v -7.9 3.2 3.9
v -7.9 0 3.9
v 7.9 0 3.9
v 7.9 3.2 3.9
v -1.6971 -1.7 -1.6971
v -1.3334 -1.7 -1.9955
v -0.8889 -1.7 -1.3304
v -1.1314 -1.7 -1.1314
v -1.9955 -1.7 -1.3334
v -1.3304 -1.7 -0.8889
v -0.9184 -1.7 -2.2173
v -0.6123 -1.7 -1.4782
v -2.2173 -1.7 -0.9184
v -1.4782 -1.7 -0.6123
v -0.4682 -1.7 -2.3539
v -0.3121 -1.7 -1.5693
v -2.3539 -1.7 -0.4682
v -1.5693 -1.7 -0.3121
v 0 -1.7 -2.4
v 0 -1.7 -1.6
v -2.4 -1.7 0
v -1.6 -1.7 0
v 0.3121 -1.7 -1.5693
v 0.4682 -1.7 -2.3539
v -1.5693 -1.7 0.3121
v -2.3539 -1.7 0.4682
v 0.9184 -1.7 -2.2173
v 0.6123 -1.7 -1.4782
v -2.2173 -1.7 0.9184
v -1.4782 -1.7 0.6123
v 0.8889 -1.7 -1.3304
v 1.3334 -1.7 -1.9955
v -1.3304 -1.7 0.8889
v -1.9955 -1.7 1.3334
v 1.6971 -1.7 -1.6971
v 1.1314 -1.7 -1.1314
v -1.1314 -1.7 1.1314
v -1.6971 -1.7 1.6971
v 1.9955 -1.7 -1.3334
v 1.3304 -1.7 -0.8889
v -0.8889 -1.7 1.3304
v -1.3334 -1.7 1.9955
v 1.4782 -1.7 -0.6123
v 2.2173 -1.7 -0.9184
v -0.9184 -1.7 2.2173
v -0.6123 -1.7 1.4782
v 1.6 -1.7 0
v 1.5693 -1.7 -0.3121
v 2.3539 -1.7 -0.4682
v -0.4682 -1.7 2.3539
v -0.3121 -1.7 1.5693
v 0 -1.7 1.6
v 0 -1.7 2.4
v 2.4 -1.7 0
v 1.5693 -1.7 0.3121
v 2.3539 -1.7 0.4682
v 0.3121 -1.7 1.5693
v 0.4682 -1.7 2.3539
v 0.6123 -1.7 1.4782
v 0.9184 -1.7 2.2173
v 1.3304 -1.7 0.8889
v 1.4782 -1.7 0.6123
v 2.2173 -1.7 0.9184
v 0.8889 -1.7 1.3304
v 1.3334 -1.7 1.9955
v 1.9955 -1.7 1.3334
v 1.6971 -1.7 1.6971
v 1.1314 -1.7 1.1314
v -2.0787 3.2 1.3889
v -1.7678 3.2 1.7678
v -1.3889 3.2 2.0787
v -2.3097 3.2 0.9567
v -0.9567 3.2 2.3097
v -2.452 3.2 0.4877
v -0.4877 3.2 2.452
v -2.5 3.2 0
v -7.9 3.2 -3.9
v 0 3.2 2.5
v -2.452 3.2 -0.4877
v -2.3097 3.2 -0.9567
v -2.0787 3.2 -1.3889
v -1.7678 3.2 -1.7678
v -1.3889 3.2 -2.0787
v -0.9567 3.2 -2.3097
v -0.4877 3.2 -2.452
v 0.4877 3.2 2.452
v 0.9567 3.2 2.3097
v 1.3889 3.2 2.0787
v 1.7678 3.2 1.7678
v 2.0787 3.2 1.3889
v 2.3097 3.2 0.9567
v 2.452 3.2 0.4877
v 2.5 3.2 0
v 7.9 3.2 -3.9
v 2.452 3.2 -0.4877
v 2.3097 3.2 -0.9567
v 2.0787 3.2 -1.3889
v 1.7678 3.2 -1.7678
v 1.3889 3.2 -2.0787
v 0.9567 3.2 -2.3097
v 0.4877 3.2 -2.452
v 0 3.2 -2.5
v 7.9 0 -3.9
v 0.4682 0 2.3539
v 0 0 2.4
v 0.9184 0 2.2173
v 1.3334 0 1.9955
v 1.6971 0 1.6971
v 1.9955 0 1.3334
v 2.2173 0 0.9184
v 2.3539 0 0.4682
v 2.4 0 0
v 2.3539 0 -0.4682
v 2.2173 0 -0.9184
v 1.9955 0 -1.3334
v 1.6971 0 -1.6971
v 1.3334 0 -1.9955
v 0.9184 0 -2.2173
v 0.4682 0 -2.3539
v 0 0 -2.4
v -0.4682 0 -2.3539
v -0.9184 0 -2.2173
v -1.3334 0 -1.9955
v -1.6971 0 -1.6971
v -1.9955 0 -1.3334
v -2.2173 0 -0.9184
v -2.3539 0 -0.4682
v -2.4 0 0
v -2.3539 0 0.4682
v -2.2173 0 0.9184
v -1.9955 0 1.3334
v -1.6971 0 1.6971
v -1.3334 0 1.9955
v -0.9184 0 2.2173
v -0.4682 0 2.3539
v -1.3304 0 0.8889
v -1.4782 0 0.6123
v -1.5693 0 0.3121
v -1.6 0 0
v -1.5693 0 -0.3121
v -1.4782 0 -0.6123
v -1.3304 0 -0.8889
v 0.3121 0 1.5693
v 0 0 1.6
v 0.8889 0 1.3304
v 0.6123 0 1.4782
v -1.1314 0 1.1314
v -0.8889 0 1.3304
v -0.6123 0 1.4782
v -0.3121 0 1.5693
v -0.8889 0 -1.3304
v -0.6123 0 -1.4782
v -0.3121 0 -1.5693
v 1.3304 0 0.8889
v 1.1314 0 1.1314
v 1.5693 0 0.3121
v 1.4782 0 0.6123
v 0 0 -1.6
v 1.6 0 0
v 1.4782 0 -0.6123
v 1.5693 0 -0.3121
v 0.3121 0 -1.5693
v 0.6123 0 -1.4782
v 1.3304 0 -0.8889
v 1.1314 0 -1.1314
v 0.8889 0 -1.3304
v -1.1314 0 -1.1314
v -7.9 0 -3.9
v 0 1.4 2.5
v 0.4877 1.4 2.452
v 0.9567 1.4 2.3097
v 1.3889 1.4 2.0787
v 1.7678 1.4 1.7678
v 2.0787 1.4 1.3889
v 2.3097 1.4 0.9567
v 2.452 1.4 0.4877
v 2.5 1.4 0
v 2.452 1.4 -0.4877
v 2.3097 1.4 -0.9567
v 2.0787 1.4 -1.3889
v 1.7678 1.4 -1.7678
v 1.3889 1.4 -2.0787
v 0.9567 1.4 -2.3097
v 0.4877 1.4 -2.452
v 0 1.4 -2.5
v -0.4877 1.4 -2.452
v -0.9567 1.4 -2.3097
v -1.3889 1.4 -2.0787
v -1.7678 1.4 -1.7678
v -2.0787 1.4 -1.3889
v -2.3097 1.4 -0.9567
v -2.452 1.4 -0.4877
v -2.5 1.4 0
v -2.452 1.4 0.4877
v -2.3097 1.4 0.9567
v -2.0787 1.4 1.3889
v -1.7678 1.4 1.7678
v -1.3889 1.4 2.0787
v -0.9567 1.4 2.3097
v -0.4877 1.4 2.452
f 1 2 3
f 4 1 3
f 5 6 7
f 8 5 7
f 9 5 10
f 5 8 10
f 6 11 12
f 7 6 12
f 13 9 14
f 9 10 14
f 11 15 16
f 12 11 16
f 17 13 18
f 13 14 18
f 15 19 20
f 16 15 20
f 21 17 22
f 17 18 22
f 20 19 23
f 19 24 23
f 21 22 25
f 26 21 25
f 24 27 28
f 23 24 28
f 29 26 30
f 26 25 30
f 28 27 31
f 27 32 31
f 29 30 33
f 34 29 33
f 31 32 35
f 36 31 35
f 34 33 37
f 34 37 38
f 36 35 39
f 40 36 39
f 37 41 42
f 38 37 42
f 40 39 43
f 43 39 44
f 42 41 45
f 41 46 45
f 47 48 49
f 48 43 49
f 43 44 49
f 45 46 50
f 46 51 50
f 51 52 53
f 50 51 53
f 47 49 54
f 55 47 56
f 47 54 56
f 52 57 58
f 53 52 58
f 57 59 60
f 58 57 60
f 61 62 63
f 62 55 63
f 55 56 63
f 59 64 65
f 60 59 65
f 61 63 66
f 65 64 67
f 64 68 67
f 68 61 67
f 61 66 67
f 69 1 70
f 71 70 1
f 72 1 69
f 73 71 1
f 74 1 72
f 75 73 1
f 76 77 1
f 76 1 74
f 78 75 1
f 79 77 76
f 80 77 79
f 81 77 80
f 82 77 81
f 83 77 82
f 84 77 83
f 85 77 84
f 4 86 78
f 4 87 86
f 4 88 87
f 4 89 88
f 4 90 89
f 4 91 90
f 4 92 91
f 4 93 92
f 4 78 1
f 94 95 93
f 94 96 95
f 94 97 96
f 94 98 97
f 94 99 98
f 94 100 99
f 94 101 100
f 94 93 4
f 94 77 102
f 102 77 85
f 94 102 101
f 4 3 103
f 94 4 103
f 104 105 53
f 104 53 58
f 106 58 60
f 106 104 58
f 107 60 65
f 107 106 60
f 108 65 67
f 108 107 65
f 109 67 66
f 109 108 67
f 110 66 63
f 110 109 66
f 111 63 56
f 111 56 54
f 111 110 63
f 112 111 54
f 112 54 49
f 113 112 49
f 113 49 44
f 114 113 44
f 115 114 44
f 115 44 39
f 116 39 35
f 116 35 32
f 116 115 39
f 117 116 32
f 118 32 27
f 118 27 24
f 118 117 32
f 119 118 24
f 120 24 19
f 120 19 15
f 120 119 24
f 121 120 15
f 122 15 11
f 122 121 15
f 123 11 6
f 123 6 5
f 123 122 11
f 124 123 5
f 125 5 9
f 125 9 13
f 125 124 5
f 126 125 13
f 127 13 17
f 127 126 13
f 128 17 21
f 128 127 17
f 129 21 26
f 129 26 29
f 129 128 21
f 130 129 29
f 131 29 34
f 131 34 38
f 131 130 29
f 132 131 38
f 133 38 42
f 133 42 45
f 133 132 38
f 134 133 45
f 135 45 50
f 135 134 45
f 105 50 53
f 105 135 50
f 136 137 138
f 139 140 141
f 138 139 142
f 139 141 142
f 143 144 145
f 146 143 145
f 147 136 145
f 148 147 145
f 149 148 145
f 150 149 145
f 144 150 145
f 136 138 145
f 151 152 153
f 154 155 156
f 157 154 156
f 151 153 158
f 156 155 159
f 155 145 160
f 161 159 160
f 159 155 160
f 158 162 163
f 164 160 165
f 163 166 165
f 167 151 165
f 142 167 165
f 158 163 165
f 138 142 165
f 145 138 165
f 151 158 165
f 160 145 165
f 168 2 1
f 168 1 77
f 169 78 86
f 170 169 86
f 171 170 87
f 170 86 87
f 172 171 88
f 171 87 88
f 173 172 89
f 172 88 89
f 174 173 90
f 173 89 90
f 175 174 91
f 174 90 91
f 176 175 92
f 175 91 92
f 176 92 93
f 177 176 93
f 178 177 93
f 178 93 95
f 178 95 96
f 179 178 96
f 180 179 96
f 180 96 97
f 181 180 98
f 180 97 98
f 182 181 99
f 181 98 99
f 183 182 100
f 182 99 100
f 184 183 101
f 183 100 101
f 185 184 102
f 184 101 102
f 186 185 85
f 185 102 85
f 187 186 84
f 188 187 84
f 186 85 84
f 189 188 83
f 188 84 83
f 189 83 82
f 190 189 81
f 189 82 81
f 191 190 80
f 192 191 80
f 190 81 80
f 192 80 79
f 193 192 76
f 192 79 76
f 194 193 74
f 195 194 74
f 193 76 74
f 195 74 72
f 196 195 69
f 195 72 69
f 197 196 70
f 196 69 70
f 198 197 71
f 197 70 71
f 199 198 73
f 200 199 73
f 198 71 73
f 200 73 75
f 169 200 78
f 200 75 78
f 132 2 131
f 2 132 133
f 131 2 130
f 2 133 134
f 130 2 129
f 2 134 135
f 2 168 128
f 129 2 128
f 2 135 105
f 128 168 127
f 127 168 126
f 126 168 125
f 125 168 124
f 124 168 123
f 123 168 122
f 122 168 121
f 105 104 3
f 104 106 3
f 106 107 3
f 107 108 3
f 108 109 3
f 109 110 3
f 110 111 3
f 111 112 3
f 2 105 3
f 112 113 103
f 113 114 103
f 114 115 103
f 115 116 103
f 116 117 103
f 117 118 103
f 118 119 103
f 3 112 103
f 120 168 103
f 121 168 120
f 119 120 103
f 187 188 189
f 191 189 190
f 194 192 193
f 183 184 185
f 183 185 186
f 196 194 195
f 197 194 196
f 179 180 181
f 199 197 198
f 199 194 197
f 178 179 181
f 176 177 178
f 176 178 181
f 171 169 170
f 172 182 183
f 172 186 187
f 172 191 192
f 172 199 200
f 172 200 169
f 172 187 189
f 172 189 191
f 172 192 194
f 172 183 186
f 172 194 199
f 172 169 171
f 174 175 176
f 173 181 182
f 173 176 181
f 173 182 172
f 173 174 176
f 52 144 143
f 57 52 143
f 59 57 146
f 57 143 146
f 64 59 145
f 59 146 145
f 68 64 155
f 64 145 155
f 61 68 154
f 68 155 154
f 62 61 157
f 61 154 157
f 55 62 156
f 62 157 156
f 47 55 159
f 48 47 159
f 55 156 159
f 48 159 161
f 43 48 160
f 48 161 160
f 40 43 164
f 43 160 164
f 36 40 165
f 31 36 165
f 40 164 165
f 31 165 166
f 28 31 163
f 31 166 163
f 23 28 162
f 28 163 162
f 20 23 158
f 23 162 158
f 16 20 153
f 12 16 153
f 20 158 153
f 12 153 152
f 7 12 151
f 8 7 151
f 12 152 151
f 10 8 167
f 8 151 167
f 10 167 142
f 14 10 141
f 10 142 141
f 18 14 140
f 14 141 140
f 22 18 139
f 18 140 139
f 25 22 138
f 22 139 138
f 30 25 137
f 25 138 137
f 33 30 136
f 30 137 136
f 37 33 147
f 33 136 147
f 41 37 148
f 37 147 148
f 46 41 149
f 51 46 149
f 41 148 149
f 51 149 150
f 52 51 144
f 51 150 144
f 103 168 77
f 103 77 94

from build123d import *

# Parameters (mm, degrees)
SKETCH_1_W          = 15.8
SKETCH_1_H          = 7.8
SKETCH_1_R          = 2.4
EXTRUDE_1_DEPTH     = 3.2
SKETCH_2_R          = 2.4
SKETCH_2_R_2        = 1.6
EXTRUDE_2_DEPTH     = 1.7
SKETCH_3_R          = 2.5
CUT_EXTRUDE_1_DEPTH = 1.8


with BuildPart() as part:
    # Эскиз1 → Бобышка-Вытянуть1 (new body)
    # profile 1 of 2: a face of its own
    with BuildSketch(Plane(origin=(0, 0, 0), x_dir=(1, 0, 0), z_dir=(0, 1, 0))):
        Rectangle(SKETCH_1_W, SKETCH_1_H)
        Circle(SKETCH_1_R, mode=Mode.SUBTRACT)
    # profile 2 of 2: a face of its own
    with BuildSketch(Plane(origin=(0, 0, 0), x_dir=(1, 0, 0), z_dir=(0, 1, 0))):
        Circle(SKETCH_1_R)
    extrude(amount=EXTRUDE_1_DEPTH)

    # Эскиз2 → Бобышка-Вытянуть2 (add)
    with BuildSketch(Plane(origin=(0, 0, 0), x_dir=(1, 0, 0), z_dir=(0, 1, 0))):
        with Locations(Location((0, 0, 0), (0, 0, 270))):
            Circle(SKETCH_2_R)
        with Locations(Location((0, 0, 0), (0, 0, 270))):
            Circle(SKETCH_2_R_2, mode=Mode.SUBTRACT)
    extrude(amount=-EXTRUDE_2_DEPTH)

    # Эскиз3 → Вырез-Вытянуть1 (cut)
    with BuildSketch(Plane(origin=(0, 3.2, 0), x_dir=(1, 0, 0), z_dir=(0, 1, 0))):
        with Locations(Location((0, 0, 0), (0, 0, 270))):
            Circle(SKETCH_3_R)
    extrude(amount=-CUT_EXTRUDE_1_DEPTH, mode=Mode.SUBTRACT)


solid = part.part
